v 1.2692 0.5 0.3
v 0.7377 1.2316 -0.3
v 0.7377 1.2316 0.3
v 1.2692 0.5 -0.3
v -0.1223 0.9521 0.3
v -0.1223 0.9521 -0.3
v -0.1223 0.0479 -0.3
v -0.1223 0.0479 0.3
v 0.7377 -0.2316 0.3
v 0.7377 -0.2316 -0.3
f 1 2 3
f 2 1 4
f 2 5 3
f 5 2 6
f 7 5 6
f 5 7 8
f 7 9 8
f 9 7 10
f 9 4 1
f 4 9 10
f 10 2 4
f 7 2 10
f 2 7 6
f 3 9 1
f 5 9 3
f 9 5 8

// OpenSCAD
rotate([0,0,0])difference()translate([0.5,0.5,0])  cylinder(r=0.769230769230769,h=0.6, center=true);
